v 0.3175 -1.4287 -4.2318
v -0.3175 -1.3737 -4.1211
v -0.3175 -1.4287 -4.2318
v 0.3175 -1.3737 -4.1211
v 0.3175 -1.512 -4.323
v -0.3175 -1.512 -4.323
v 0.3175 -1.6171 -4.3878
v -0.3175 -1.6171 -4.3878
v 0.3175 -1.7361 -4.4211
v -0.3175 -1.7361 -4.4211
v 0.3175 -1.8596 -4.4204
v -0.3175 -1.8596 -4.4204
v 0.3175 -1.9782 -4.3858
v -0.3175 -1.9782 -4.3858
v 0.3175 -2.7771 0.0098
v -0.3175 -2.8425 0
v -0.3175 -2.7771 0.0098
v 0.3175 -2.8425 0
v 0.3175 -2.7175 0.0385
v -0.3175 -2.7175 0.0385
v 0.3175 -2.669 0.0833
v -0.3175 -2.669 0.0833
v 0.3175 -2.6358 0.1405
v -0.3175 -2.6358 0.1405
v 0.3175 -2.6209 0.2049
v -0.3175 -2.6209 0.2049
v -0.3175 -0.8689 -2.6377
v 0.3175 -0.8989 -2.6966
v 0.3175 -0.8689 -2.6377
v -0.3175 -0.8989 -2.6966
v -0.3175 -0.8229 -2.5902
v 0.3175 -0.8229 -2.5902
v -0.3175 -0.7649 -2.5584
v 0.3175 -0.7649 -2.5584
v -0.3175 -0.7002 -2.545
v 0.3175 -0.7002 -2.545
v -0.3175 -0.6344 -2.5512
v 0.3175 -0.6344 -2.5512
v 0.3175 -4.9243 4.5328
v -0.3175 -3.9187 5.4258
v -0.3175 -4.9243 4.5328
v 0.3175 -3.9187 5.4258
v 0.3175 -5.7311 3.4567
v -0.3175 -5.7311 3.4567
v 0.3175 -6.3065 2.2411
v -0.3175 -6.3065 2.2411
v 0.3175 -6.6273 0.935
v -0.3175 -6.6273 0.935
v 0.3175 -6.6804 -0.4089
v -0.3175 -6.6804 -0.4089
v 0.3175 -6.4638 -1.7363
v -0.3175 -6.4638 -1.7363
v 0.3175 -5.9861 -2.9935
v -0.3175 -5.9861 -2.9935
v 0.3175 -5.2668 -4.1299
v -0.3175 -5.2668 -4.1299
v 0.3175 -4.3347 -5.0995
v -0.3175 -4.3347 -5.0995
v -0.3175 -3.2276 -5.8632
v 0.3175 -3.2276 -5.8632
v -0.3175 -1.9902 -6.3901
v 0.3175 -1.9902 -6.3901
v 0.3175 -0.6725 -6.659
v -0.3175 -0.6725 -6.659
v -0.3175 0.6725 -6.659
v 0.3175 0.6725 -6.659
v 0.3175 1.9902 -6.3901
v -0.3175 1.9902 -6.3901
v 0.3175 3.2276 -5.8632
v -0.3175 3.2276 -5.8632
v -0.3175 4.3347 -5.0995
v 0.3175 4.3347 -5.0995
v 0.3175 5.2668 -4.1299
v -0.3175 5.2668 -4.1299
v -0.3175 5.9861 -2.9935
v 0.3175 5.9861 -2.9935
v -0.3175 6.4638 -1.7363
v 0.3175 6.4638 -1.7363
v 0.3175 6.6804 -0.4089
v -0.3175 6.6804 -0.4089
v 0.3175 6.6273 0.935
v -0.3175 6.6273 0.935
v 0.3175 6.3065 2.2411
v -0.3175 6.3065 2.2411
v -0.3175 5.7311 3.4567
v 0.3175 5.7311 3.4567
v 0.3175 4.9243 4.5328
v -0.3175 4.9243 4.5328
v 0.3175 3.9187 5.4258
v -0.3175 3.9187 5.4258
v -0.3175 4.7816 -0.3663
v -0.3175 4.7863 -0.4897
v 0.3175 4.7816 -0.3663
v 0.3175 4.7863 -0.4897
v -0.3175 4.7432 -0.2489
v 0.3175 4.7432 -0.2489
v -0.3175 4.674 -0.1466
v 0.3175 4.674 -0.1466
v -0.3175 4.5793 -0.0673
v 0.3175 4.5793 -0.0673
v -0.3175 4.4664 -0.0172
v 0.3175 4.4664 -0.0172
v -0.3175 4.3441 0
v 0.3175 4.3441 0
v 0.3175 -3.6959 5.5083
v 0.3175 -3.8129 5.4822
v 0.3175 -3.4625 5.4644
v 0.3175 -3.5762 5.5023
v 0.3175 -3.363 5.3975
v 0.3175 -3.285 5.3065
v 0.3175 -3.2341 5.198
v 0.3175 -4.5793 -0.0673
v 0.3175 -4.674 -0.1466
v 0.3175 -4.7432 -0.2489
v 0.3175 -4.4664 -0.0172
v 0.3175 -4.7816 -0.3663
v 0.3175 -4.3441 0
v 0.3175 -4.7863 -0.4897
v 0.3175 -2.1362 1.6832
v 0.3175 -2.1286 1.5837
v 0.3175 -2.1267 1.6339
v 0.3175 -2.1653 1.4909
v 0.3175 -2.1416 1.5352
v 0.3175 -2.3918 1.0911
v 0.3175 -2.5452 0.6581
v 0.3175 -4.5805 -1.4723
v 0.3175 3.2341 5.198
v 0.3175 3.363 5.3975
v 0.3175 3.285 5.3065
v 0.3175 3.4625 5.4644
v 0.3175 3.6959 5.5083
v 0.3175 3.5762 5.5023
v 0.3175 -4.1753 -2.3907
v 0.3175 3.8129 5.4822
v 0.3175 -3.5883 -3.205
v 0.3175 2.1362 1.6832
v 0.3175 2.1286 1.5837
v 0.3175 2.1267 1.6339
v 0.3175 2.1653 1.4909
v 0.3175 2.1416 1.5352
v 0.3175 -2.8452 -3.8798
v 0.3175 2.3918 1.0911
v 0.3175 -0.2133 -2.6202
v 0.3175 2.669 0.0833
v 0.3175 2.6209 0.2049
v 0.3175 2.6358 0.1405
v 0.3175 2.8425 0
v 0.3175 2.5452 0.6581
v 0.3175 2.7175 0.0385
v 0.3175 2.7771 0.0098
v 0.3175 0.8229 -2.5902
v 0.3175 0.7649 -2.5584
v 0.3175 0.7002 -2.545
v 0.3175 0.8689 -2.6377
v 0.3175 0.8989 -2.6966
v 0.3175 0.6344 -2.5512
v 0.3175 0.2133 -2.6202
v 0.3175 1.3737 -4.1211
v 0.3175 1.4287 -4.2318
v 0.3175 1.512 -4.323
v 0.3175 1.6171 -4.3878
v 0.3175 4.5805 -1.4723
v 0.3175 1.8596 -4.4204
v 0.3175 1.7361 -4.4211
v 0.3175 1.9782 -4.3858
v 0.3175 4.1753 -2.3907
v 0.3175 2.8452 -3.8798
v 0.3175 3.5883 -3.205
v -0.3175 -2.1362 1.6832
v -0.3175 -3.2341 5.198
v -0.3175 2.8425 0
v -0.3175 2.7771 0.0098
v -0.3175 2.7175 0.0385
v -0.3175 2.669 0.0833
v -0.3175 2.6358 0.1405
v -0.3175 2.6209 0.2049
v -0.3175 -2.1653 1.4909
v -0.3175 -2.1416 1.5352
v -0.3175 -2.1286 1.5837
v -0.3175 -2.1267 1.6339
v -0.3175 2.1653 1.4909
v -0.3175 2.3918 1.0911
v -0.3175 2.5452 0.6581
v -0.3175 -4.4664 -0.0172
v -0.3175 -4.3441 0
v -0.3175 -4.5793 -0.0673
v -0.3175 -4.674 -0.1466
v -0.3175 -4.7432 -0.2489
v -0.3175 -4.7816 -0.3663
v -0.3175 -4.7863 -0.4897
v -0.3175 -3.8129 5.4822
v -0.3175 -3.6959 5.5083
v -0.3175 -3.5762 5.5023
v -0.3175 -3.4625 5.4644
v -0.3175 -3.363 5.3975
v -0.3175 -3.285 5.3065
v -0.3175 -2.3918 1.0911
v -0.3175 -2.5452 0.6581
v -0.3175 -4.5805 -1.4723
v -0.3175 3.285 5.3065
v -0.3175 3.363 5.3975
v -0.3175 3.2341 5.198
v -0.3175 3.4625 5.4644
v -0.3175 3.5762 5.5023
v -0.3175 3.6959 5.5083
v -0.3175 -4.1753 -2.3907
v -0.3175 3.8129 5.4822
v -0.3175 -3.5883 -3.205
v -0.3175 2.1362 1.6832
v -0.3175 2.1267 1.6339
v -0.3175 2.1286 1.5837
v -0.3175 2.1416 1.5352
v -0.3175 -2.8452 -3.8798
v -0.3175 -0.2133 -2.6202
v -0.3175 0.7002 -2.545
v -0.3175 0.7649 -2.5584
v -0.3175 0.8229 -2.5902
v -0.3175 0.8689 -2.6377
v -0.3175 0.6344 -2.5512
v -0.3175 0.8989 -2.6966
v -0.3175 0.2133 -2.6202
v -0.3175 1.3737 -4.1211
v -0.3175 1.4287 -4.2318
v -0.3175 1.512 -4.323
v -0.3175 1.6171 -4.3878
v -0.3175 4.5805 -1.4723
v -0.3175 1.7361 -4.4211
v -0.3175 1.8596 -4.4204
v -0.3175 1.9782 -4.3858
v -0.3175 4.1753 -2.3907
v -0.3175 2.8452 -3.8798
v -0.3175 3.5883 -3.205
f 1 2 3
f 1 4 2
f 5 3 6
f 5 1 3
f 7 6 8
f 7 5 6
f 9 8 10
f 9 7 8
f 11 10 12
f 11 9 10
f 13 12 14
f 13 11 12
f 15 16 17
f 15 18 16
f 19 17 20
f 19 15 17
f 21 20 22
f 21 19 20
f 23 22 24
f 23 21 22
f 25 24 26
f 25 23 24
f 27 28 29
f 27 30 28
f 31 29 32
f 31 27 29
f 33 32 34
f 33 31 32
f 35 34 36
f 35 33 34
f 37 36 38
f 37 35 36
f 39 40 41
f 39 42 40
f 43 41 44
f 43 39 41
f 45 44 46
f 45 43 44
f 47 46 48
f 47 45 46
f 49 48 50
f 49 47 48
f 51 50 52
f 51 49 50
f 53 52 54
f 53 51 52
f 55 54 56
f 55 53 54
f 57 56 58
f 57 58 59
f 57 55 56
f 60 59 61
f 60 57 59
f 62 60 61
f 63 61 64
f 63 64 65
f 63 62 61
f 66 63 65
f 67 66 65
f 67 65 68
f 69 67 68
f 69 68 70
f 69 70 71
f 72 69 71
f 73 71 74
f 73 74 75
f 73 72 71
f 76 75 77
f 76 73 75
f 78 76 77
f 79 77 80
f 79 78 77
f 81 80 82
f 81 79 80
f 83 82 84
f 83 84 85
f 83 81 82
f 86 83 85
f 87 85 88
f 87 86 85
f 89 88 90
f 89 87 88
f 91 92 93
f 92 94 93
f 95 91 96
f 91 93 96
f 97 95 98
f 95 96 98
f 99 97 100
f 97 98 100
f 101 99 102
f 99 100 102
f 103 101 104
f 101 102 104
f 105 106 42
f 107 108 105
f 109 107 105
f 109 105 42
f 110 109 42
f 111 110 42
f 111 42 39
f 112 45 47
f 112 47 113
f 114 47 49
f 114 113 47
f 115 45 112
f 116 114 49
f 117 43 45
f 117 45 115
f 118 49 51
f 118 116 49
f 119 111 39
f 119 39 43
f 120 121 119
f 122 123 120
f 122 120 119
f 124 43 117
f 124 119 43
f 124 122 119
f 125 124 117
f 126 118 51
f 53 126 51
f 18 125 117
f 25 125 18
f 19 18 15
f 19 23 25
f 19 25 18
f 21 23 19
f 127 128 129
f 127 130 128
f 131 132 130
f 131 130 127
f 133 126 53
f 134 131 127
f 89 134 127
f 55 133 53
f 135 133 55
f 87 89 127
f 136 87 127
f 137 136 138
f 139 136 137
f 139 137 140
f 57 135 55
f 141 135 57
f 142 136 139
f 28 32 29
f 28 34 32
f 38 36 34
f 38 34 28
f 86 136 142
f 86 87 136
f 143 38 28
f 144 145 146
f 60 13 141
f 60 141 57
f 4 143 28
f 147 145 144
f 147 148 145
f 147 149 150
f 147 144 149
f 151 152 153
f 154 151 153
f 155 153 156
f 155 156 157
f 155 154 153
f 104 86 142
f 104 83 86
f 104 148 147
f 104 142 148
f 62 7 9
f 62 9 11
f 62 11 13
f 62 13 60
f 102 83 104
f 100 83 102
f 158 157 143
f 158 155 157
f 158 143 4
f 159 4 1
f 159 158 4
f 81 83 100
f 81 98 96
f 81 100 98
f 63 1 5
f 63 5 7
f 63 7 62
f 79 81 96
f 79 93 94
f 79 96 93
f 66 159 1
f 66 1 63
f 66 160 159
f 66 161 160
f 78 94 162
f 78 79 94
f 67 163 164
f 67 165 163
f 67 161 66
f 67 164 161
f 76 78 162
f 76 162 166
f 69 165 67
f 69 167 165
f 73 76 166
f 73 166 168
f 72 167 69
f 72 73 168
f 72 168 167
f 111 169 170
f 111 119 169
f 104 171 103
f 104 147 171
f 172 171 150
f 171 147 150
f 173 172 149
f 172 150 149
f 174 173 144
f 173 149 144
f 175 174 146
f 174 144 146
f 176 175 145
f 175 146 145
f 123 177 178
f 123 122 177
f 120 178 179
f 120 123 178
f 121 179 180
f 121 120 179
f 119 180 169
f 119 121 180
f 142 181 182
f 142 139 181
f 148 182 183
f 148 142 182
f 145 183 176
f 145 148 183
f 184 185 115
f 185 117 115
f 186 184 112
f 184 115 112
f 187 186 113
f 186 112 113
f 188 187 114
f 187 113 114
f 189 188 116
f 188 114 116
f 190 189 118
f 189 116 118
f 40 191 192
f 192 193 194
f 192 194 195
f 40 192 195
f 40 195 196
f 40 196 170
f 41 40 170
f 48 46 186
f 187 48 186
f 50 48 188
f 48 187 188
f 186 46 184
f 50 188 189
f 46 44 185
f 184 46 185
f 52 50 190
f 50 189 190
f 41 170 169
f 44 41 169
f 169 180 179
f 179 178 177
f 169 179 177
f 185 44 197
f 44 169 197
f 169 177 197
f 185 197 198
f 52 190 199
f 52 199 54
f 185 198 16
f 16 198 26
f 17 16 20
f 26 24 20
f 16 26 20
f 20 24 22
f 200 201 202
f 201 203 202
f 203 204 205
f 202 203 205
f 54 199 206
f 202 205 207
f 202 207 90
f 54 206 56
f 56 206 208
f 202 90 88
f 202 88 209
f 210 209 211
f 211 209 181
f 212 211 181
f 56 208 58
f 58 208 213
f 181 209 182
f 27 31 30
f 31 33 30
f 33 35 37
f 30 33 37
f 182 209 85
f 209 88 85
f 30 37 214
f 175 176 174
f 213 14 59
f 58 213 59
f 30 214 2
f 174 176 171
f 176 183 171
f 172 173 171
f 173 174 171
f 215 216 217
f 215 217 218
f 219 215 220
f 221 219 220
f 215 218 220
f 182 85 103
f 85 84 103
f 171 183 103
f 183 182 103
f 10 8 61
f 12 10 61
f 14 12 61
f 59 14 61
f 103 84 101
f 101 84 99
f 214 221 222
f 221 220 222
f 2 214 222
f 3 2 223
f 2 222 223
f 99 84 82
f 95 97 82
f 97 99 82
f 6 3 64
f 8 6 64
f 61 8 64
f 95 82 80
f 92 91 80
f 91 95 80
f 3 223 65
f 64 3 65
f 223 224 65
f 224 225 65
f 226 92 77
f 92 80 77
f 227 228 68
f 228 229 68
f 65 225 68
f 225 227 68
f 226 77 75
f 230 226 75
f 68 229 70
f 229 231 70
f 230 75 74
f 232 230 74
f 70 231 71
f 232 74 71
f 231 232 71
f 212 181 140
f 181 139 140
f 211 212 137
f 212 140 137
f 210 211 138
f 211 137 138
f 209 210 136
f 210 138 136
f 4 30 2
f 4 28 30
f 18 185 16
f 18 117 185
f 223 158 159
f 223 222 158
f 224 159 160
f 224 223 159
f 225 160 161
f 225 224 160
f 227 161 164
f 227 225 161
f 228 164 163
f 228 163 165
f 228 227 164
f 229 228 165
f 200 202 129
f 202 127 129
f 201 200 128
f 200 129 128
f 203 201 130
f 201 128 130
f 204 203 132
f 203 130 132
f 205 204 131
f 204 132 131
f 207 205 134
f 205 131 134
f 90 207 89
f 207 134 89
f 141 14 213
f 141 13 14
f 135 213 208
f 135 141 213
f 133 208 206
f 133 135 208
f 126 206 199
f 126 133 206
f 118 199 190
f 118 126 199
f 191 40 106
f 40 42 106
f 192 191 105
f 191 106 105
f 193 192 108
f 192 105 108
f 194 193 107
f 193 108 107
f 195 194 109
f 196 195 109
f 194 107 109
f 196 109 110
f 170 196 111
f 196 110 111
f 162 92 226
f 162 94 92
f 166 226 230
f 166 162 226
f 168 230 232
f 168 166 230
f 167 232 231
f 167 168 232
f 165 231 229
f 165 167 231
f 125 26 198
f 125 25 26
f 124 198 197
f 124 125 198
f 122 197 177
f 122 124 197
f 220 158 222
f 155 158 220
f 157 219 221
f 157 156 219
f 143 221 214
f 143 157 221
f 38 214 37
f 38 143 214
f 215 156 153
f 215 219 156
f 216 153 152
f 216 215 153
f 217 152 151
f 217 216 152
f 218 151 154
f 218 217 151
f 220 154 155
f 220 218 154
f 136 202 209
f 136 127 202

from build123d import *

# Parameters (mm, degrees)
BOSS_EXTRUDE1_DEPTH      = 0.3175
BOSS_EXTRUDE1_DEPTH_BACK = 0.3175
FILLET1_R                = 0.4445
FILLET2_R                = 0.22225


with BuildPart() as part:
    # Sketch3 → Boss-Extrude1 (new body, two sides)
    with BuildSketch(Plane(origin=(0, 0, 0), x_dir=(0, 0, -1), z_dir=(1, 0, 0))) as boss_extrude1_sk:
        with BuildLine():
            Line((2.493993522, -0.831331174), (4.564354048, -1.521451349))
            ThreePointArc((4.564354048, -1.521451349), (2.8131883, -3.903090272), (0, -4.811251613))
            Line((0, -4.811251613), (0, -2.6289))
            ThreePointArc((0, -2.6289), (-0.831331174, -2.493993522), (-1.57734, -2.10312))
            Line((-1.57734, -2.10312), (-5.759367109, -3.409486899))
            ThreePointArc((-5.759367109, -3.409486899), (6.6929, 0), (-5.759367109, 3.409486899))
            Line((-5.759367109, 3.409486899), (-1.57734, 2.10312))
            ThreePointArc((-1.57734, 2.10312), (-0.831331174, 2.493993522), (0, 2.6289))
            Line((0, 2.6289), (0, 4.811251613))
            ThreePointArc((0, 4.811251613), (2.8131883, 3.903090272), (4.564354048, 1.521451349))
            Line((4.564354048, 1.521451349), (2.493993522, 0.831331174))
            ThreePointArc((2.493993522, 0.831331174), (2.6289, 0), (2.493993522, -0.831331174))
        make_face()
    extrude(amount=BOSS_EXTRUDE1_DEPTH)
    extrude(boss_extrude1_sk.sketch, amount=-BOSS_EXTRUDE1_DEPTH_BACK)

    # Fillet1
    fillet1_edges = [part.edges().sort_by_distance(p)[0] for p in [
        (0, 1.521451349, -4.564354048),
        (0, 4.811251613, 0),
        (0, 3.409486899, 5.759367109),
        (0, -3.409486899, 5.759367109),
        (0, -4.811251613, 0),
        (0, -1.521451349, -4.564354048),
    ]]
    fillet(fillet1_edges, radius=FILLET1_R)

    # Fillet2
    fillet2_edges = [part.edges().sort_by_distance(p)[0] for p in [
        (0, 0.831331174, -2.493993522),
        (0, 2.6289, 0),
        (0, 2.10312, 1.57734),
        (0, -2.10312, 1.57734),
        (0, -2.6289, 0),
        (0, -0.831331174, -2.493993522),
    ]]
    fillet(fillet2_edges, radius=FILLET2_R)


solid = part.part
